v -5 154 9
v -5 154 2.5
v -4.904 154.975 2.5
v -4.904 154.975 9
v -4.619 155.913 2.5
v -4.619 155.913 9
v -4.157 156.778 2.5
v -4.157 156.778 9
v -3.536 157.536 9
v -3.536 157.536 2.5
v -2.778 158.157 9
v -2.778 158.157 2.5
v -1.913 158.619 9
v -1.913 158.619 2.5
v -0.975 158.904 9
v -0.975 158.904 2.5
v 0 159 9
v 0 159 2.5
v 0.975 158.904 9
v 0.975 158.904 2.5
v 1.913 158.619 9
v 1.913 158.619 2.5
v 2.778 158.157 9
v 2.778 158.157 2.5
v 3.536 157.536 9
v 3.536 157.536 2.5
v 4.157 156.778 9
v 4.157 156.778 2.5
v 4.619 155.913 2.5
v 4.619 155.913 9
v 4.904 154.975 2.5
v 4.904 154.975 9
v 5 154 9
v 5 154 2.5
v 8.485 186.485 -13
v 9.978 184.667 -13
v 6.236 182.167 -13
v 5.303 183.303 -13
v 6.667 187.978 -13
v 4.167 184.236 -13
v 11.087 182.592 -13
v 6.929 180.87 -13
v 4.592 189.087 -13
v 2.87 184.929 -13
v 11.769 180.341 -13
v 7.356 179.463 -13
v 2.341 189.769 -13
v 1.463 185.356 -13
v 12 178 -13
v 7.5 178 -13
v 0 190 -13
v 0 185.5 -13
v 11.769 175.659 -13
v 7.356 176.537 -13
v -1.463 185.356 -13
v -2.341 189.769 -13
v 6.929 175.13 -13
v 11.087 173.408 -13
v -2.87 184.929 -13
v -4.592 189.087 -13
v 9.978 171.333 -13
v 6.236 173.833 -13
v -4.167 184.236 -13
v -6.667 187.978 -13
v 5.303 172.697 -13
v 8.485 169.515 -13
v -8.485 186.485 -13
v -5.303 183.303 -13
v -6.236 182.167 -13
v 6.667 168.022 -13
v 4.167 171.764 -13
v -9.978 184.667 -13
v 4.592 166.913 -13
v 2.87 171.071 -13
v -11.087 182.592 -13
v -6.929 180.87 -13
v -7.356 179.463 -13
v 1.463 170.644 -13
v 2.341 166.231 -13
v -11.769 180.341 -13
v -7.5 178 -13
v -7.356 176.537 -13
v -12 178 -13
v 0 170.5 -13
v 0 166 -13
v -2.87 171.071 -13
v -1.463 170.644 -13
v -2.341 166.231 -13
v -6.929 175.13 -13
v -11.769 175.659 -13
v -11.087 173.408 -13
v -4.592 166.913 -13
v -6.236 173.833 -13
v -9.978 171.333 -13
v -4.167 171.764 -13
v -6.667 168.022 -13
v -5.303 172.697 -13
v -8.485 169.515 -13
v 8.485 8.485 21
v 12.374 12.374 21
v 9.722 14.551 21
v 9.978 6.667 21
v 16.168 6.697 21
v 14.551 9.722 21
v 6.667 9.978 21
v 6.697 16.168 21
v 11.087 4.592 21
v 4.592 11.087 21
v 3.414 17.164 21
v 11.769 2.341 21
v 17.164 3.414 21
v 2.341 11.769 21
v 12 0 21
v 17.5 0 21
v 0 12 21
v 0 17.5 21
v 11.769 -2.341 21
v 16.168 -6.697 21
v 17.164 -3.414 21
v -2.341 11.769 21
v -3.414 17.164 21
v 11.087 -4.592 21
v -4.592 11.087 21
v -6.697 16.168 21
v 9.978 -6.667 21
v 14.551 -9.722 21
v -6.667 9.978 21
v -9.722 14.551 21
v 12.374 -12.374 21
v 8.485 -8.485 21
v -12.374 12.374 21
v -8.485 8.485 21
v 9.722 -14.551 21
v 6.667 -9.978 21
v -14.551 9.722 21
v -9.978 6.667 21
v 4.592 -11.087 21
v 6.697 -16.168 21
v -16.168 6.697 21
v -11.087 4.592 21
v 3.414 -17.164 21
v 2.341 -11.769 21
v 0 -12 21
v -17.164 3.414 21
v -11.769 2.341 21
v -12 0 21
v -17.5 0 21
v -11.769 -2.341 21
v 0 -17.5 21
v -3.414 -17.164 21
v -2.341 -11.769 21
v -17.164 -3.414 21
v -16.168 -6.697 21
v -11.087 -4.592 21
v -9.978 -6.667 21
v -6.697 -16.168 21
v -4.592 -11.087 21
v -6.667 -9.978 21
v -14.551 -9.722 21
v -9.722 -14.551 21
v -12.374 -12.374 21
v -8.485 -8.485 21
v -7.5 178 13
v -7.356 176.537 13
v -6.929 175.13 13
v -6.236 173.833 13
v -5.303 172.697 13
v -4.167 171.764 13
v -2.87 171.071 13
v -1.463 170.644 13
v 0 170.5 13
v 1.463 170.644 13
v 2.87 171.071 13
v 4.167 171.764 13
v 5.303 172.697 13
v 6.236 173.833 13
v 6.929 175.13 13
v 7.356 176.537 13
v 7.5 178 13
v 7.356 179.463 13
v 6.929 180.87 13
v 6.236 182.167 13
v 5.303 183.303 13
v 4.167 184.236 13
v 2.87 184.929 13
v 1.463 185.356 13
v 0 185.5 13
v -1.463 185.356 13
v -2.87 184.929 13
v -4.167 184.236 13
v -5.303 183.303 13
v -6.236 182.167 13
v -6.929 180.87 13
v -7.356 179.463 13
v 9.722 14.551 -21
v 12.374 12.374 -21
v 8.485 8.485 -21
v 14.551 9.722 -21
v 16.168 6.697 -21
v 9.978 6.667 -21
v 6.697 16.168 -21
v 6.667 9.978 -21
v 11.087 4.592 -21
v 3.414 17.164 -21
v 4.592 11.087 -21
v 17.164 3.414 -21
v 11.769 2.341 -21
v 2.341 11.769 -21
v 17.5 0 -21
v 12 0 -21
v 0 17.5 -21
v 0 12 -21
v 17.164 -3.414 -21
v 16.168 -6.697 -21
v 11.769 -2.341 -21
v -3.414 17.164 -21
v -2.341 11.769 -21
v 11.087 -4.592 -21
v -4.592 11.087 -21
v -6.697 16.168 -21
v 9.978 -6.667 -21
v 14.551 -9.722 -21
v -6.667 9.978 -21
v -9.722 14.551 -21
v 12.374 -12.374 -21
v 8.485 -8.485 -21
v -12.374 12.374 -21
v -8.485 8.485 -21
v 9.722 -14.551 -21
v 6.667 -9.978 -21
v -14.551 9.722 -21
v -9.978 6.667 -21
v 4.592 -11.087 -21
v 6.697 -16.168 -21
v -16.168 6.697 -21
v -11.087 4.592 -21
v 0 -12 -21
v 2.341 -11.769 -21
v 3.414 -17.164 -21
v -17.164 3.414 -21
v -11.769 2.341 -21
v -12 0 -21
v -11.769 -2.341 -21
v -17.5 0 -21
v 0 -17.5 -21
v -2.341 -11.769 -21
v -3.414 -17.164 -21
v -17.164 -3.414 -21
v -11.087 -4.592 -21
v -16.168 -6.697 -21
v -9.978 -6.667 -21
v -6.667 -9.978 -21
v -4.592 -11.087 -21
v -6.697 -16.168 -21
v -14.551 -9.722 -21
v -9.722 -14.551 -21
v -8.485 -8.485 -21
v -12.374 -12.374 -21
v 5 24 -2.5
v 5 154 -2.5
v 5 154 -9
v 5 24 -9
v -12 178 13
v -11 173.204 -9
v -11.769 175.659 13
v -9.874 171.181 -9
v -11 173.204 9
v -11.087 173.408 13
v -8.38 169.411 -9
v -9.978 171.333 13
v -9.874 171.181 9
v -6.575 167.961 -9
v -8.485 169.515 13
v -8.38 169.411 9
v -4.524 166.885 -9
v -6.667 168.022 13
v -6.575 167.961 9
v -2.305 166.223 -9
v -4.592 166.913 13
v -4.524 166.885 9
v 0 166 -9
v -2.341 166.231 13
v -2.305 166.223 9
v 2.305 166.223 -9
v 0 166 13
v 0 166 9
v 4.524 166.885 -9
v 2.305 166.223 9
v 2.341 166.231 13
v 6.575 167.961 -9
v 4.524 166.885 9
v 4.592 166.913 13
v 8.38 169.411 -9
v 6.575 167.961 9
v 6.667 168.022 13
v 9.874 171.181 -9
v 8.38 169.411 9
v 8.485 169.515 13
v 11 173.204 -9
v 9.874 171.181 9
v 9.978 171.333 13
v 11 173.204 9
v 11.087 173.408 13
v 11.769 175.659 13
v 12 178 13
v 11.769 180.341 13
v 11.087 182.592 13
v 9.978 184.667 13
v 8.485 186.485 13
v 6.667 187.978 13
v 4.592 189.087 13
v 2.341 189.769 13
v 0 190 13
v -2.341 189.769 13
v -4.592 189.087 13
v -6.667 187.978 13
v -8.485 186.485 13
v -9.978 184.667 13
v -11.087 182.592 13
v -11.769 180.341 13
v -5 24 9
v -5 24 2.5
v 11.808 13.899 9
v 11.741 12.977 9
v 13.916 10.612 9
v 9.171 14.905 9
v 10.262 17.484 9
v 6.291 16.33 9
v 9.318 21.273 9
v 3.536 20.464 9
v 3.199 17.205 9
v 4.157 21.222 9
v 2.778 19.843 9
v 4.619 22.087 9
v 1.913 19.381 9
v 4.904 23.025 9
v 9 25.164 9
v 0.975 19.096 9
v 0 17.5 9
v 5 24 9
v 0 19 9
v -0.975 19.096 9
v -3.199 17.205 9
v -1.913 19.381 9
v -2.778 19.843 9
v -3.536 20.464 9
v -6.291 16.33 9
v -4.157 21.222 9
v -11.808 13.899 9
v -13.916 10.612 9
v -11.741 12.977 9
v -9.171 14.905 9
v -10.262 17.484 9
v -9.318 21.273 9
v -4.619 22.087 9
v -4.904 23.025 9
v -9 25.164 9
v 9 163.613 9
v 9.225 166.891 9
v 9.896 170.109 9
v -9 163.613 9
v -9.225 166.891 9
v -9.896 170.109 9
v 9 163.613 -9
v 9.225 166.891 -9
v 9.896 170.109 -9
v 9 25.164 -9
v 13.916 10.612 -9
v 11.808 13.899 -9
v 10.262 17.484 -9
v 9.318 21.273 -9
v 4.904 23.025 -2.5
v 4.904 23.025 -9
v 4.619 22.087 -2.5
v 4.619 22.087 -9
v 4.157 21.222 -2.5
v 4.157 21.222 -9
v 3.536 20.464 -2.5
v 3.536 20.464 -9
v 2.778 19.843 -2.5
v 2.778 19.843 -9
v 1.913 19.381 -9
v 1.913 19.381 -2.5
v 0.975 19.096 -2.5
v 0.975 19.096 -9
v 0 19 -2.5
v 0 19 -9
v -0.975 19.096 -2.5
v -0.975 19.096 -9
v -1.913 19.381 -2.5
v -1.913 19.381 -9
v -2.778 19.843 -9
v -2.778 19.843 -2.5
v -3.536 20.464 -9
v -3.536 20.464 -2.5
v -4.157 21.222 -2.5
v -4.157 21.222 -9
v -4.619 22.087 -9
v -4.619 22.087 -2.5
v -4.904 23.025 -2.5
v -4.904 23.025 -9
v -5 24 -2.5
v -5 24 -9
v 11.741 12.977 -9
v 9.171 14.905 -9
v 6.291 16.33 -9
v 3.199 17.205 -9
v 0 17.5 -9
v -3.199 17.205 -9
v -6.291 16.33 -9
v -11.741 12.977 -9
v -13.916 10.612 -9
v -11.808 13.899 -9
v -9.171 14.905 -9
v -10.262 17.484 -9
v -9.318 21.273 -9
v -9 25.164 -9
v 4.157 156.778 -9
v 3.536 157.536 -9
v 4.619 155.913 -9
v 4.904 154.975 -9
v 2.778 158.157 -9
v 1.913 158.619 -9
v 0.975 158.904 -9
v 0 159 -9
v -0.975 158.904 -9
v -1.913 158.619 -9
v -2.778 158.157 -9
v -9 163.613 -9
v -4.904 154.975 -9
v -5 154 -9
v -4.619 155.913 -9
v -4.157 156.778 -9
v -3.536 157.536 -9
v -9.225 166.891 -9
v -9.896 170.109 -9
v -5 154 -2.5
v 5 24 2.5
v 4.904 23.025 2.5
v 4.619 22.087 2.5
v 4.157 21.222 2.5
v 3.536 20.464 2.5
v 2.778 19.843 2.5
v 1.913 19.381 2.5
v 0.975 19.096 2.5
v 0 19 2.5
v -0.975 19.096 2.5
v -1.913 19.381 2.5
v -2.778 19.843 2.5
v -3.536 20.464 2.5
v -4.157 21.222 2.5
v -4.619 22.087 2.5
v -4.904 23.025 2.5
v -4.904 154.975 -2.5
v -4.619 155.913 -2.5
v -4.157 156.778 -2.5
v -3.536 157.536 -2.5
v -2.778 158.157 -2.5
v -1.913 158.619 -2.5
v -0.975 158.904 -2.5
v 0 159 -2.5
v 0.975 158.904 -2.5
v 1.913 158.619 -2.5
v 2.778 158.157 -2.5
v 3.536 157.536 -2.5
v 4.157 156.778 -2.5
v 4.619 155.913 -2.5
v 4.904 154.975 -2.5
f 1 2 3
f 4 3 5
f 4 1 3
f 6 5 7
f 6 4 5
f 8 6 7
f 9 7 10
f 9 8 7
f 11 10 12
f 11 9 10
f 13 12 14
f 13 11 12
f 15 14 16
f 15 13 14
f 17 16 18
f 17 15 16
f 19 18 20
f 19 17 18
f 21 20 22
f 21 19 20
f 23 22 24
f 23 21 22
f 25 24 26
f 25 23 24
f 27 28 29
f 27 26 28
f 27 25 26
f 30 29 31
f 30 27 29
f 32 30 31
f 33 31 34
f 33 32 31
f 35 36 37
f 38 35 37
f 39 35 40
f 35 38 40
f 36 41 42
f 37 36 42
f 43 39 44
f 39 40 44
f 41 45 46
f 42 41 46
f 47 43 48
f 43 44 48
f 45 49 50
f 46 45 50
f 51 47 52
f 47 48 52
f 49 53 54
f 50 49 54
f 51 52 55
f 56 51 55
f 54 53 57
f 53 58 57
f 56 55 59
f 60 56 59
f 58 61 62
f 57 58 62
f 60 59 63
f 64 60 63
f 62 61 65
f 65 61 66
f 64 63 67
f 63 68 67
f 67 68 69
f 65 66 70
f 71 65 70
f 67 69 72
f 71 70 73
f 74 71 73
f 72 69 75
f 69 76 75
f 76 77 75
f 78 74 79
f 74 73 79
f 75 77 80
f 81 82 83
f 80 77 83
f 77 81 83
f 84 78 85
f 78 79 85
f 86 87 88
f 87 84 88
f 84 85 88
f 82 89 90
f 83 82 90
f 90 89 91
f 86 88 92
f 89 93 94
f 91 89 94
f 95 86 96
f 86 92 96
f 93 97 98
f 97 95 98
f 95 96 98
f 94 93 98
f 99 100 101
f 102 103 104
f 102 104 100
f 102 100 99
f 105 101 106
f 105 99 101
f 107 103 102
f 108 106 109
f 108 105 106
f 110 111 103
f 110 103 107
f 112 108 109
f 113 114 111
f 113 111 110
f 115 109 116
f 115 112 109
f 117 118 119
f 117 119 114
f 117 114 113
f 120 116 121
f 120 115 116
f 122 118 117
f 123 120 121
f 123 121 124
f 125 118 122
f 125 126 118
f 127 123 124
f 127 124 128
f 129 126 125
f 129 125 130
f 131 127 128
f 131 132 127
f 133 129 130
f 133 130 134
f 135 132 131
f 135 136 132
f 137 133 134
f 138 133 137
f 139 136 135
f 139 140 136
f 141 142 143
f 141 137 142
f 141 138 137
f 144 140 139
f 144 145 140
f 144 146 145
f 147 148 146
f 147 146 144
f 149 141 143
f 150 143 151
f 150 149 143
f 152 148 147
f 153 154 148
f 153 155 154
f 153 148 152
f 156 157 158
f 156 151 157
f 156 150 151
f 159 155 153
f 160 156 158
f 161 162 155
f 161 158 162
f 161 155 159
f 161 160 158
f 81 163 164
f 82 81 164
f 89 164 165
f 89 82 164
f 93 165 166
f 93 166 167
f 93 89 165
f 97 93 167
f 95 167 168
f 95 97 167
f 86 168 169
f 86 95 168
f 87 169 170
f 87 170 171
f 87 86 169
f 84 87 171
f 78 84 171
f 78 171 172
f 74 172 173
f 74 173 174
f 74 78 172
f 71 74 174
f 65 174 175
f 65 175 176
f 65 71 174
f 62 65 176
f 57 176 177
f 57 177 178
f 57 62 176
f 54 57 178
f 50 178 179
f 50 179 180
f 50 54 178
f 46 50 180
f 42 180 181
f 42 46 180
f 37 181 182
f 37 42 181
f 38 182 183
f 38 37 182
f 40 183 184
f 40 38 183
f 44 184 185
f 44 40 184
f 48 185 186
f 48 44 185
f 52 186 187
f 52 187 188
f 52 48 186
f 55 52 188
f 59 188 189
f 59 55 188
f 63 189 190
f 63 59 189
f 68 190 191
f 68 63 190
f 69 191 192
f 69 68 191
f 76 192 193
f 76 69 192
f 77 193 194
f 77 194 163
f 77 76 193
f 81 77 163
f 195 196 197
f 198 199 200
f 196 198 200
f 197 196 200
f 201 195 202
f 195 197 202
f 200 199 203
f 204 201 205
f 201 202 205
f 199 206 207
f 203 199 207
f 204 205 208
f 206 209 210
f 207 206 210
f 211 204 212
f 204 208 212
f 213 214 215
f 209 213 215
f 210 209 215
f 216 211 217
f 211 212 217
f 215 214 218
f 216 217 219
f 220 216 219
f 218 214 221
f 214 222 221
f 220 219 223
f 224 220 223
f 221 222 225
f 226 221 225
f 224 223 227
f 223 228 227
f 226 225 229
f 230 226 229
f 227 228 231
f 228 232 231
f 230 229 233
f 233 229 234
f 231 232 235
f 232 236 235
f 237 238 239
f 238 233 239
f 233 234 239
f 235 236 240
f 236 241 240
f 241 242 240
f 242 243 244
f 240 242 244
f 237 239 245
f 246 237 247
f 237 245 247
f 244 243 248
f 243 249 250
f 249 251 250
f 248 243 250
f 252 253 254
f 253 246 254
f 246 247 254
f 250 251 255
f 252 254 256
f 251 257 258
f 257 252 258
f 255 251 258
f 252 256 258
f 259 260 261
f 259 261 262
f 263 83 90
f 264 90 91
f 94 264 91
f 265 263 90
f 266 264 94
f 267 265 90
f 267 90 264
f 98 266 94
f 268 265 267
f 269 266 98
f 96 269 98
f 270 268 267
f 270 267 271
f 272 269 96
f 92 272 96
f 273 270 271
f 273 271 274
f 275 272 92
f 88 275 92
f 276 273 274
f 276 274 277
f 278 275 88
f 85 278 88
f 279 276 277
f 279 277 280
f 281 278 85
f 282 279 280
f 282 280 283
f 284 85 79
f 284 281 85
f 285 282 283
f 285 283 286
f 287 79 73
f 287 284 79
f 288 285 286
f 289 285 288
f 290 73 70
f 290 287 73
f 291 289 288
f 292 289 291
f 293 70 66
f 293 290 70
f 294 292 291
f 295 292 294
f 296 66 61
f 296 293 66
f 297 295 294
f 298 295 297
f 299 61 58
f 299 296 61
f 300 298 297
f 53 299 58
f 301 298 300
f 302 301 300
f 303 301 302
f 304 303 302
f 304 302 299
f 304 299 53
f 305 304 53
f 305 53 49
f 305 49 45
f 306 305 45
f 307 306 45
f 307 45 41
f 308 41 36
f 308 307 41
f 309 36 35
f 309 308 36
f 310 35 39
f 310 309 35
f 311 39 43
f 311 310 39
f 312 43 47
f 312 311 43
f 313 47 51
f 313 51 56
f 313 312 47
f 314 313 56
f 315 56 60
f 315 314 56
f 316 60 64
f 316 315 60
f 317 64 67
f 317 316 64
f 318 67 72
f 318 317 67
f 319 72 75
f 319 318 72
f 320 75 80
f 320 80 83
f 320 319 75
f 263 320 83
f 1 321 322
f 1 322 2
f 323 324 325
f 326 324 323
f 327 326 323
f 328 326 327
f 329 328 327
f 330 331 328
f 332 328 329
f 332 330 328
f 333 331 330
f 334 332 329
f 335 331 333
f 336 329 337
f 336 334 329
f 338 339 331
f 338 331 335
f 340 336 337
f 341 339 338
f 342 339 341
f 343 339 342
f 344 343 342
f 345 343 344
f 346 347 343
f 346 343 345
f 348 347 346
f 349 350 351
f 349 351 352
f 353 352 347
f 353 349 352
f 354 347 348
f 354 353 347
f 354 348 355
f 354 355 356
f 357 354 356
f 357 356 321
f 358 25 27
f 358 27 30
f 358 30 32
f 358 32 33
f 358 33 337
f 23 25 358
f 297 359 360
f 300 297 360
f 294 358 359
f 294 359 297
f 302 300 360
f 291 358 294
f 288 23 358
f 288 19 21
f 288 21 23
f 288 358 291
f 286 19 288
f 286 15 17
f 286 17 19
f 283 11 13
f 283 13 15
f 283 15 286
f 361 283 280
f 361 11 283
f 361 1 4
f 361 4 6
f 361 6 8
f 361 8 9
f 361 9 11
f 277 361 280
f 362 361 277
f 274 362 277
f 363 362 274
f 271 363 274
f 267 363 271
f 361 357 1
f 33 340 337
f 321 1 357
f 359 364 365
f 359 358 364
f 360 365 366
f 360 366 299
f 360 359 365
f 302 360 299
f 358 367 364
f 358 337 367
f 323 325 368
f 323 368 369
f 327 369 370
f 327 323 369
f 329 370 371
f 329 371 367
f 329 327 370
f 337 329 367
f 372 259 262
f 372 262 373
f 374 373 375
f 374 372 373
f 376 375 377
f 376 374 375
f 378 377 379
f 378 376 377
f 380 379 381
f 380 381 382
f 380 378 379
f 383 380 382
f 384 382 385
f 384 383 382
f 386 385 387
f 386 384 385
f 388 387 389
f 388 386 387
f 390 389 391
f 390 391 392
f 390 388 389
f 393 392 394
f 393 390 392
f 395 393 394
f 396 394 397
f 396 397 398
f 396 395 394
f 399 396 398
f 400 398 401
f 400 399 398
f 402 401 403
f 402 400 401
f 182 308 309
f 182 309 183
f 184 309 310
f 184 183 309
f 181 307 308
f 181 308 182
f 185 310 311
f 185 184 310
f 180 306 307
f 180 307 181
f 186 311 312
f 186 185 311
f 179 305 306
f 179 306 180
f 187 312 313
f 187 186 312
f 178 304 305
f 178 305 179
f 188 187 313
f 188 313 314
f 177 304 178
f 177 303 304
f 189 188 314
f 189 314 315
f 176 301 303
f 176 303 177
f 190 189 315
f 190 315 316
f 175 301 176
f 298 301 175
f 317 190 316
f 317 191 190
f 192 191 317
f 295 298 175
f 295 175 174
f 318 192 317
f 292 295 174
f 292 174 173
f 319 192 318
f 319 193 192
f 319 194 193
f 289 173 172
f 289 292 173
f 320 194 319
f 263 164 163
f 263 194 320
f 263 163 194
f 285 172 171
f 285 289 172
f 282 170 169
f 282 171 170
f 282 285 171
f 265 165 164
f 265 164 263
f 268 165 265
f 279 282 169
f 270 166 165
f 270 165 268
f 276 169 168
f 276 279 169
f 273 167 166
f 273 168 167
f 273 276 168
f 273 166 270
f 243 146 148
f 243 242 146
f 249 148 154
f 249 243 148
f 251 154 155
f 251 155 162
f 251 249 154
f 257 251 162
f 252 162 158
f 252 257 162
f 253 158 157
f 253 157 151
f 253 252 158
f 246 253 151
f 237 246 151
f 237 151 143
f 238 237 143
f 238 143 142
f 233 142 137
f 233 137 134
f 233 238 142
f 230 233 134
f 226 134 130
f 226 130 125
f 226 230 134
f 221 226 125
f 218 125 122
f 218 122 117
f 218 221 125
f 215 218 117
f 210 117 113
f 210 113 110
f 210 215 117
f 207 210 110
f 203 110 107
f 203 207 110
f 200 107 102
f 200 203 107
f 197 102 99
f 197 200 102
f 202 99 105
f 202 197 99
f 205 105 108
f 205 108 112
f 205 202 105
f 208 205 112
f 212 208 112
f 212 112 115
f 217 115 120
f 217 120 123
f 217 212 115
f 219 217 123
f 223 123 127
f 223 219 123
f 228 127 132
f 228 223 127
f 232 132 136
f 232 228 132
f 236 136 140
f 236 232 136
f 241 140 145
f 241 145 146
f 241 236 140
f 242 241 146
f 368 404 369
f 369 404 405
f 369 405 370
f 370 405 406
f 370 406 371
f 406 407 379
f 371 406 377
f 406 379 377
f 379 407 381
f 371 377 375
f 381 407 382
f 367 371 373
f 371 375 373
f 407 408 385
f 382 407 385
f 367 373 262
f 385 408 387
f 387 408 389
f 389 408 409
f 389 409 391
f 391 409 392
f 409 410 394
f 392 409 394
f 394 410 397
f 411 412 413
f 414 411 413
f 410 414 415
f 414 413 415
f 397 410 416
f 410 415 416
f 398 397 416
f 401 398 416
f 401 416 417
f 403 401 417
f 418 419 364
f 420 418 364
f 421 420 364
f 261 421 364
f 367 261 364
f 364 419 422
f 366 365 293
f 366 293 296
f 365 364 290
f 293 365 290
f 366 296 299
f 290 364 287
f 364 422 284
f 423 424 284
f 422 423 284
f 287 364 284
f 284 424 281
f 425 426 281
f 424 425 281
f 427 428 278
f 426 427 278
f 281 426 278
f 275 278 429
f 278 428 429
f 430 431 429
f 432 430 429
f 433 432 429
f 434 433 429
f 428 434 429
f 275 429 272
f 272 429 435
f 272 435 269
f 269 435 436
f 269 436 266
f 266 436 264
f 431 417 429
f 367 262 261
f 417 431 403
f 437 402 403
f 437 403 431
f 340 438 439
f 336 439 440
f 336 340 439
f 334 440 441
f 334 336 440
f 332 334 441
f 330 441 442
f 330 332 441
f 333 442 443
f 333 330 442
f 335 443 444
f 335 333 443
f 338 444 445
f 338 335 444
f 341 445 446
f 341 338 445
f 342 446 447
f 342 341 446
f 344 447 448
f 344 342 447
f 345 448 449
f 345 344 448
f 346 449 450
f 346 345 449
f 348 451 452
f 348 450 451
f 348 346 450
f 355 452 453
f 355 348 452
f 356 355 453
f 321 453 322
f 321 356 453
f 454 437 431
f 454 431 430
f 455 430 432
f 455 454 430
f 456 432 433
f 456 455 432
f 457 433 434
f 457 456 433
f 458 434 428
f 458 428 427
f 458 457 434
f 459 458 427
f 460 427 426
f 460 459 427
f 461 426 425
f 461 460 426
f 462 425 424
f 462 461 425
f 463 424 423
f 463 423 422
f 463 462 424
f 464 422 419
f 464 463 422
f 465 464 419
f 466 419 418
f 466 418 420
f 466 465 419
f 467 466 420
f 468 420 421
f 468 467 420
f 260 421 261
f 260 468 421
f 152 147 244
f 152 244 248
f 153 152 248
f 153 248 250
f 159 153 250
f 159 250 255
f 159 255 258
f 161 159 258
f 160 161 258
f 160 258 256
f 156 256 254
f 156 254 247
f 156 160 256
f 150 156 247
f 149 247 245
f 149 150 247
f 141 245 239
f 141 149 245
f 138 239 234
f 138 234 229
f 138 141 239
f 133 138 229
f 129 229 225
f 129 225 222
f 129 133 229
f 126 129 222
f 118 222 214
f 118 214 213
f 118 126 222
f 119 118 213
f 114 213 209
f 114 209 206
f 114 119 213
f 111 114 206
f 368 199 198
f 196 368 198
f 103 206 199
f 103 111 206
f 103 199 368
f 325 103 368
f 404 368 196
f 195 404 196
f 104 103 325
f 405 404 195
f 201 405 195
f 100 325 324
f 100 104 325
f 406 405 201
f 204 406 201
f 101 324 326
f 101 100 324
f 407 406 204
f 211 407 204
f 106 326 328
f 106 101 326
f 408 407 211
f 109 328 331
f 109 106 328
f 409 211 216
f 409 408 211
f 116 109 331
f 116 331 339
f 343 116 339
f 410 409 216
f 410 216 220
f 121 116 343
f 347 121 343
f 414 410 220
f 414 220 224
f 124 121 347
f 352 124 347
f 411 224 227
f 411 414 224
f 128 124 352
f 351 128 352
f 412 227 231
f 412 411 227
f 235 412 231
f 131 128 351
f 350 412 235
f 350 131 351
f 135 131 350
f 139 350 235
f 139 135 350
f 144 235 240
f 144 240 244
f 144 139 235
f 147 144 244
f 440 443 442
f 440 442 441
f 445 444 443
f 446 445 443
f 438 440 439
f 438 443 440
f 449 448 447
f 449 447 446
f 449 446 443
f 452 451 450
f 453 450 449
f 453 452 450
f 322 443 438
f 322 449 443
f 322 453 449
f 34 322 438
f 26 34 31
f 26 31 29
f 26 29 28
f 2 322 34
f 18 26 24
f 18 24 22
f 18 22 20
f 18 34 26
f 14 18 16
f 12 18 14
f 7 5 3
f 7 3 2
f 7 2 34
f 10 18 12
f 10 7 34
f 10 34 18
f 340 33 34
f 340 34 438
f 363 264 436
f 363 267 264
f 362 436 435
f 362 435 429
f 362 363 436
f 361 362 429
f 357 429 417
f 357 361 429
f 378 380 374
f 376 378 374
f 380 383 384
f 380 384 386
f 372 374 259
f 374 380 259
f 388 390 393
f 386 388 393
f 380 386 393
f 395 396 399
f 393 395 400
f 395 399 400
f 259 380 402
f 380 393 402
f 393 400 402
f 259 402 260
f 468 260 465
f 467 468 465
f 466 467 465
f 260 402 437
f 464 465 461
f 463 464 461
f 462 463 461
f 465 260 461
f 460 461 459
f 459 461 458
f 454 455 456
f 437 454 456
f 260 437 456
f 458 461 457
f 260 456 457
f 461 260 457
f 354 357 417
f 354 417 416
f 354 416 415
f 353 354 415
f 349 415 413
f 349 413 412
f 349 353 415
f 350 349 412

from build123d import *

# Parameters (mm, degrees)
SKETCH1_R           = 12
BOSS_EXTRUDE1_DEPTH = 21
SKETCH1_3_R         = 7.5
BOSS_EXTRUDE2_DEPTH = 13
BOSS_EXTRUDE3_DEPTH = 9
BOSS_EXTRUDE4_DEPTH = 2.5


with BuildPart() as part:
    # Sketch1 → Boss-Extrude1 (new, symmetric)
    with BuildSketch(Plane(origin=(0, 0, 0), x_dir=(0, 1, 0), z_dir=(0, 0, 1))):
        with BuildLine():
            ThreePointArc((17.5, 0), (15.683615343, 7.76364668), (10.611518883, 13.915662651))
            ThreePointArc((10.611518883, 13.915662651), (-17.5, 0), (10.611518883, -13.915662651))
            ThreePointArc((10.611518883, -13.915662651), (15.683615343, -7.76364668), (17.5, 0))
        make_face()
        Circle(SKETCH1_R, mode=Mode.SUBTRACT)
    extrude(amount=BOSS_EXTRUDE1_DEPTH, both=True)



with BuildPart() as body_2:
    # Sketch1<3> → Boss-Extrude2 (new, symmetric)
    with BuildSketch(Plane(origin=(0, 0, 0), x_dir=(0, 1, 0), z_dir=(0, 0, 1))):
        with BuildLine():
            ThreePointArc((190, 0), (184.574573055, 10.03867467), (173.204168477, 11))
            ThreePointArc((173.204168477, 11), (166, 0), (173.204168477, -11))
            ThreePointArc((173.204168477, -11), (184.574573055, -10.03867467), (190, 0))
        make_face()
        with Locations((178, 0)):
            Circle(SKETCH1_3_R, mode=Mode.SUBTRACT)
    extrude(amount=BOSS_EXTRUDE2_DEPTH, both=True)


with BuildPart() as part_1:
    add(part.part)

    add(body_2.part)  # Boss-Extrude3 merges body 2
    # Sketch1<4> → Boss-Extrude3 (add, symmetric)
    with BuildSketch(Plane(origin=(0, 0, 0), x_dir=(0, 1, 0), z_dir=(0, 0, 1))):
        with BuildLine():
            Line((163.61250543, 9), (25.164459064, 9))
            ThreePointArc((25.164459064, 9), (17.484097627, 10.26210106), (10.611518883, 13.915662651))
            ThreePointArc((10.611518883, 13.915662651), (15.683615343, 7.76364668), (17.5, 0))
            ThreePointArc((17.5, 0), (15.683615343, -7.76364668), (10.611518883, -13.915662651))
            ThreePointArc((10.611518883, -13.915662651), (17.484097627, -10.26210106), (25.164459064, -9))
            Line((25.164459064, -9), (163.61250543, -9))
            ThreePointArc((163.61250543, -9), (168.511484916, -9.505319751), (173.204168477, -11))
            ThreePointArc((173.204168477, -11), (166, 0), (173.204168477, 11))
            ThreePointArc((173.204168477, 11), (168.511484916, 9.505319751), (163.61250543, 9))
        make_face()
        with BuildLine():
            ThreePointArc((24, -5), (19, 0), (24, 5))
            Line((24, 5), (154, 5))
            ThreePointArc((154, 5), (159, 0), (154, -5))
            Line((154, -5), (24, -5))
        make_face(mode=Mode.SUBTRACT)
    extrude(amount=BOSS_EXTRUDE3_DEPTH, both=True)

    # Sketch1<5> → Boss-Extrude4 (add, symmetric)
    with BuildSketch(Plane(origin=(0, 0, 0), x_dir=(0, 1, 0), z_dir=(0, 0, 1))):
        with BuildLine():
            Line((154, 5), (24, 5))
            ThreePointArc((24, 5), (19, 0), (24, -5))
            Line((24, -5), (154, -5))
            ThreePointArc((154, -5), (159, 0), (154, 5))
        make_face()
    extrude(amount=BOSS_EXTRUDE4_DEPTH, both=True)


solid = part_1.part
